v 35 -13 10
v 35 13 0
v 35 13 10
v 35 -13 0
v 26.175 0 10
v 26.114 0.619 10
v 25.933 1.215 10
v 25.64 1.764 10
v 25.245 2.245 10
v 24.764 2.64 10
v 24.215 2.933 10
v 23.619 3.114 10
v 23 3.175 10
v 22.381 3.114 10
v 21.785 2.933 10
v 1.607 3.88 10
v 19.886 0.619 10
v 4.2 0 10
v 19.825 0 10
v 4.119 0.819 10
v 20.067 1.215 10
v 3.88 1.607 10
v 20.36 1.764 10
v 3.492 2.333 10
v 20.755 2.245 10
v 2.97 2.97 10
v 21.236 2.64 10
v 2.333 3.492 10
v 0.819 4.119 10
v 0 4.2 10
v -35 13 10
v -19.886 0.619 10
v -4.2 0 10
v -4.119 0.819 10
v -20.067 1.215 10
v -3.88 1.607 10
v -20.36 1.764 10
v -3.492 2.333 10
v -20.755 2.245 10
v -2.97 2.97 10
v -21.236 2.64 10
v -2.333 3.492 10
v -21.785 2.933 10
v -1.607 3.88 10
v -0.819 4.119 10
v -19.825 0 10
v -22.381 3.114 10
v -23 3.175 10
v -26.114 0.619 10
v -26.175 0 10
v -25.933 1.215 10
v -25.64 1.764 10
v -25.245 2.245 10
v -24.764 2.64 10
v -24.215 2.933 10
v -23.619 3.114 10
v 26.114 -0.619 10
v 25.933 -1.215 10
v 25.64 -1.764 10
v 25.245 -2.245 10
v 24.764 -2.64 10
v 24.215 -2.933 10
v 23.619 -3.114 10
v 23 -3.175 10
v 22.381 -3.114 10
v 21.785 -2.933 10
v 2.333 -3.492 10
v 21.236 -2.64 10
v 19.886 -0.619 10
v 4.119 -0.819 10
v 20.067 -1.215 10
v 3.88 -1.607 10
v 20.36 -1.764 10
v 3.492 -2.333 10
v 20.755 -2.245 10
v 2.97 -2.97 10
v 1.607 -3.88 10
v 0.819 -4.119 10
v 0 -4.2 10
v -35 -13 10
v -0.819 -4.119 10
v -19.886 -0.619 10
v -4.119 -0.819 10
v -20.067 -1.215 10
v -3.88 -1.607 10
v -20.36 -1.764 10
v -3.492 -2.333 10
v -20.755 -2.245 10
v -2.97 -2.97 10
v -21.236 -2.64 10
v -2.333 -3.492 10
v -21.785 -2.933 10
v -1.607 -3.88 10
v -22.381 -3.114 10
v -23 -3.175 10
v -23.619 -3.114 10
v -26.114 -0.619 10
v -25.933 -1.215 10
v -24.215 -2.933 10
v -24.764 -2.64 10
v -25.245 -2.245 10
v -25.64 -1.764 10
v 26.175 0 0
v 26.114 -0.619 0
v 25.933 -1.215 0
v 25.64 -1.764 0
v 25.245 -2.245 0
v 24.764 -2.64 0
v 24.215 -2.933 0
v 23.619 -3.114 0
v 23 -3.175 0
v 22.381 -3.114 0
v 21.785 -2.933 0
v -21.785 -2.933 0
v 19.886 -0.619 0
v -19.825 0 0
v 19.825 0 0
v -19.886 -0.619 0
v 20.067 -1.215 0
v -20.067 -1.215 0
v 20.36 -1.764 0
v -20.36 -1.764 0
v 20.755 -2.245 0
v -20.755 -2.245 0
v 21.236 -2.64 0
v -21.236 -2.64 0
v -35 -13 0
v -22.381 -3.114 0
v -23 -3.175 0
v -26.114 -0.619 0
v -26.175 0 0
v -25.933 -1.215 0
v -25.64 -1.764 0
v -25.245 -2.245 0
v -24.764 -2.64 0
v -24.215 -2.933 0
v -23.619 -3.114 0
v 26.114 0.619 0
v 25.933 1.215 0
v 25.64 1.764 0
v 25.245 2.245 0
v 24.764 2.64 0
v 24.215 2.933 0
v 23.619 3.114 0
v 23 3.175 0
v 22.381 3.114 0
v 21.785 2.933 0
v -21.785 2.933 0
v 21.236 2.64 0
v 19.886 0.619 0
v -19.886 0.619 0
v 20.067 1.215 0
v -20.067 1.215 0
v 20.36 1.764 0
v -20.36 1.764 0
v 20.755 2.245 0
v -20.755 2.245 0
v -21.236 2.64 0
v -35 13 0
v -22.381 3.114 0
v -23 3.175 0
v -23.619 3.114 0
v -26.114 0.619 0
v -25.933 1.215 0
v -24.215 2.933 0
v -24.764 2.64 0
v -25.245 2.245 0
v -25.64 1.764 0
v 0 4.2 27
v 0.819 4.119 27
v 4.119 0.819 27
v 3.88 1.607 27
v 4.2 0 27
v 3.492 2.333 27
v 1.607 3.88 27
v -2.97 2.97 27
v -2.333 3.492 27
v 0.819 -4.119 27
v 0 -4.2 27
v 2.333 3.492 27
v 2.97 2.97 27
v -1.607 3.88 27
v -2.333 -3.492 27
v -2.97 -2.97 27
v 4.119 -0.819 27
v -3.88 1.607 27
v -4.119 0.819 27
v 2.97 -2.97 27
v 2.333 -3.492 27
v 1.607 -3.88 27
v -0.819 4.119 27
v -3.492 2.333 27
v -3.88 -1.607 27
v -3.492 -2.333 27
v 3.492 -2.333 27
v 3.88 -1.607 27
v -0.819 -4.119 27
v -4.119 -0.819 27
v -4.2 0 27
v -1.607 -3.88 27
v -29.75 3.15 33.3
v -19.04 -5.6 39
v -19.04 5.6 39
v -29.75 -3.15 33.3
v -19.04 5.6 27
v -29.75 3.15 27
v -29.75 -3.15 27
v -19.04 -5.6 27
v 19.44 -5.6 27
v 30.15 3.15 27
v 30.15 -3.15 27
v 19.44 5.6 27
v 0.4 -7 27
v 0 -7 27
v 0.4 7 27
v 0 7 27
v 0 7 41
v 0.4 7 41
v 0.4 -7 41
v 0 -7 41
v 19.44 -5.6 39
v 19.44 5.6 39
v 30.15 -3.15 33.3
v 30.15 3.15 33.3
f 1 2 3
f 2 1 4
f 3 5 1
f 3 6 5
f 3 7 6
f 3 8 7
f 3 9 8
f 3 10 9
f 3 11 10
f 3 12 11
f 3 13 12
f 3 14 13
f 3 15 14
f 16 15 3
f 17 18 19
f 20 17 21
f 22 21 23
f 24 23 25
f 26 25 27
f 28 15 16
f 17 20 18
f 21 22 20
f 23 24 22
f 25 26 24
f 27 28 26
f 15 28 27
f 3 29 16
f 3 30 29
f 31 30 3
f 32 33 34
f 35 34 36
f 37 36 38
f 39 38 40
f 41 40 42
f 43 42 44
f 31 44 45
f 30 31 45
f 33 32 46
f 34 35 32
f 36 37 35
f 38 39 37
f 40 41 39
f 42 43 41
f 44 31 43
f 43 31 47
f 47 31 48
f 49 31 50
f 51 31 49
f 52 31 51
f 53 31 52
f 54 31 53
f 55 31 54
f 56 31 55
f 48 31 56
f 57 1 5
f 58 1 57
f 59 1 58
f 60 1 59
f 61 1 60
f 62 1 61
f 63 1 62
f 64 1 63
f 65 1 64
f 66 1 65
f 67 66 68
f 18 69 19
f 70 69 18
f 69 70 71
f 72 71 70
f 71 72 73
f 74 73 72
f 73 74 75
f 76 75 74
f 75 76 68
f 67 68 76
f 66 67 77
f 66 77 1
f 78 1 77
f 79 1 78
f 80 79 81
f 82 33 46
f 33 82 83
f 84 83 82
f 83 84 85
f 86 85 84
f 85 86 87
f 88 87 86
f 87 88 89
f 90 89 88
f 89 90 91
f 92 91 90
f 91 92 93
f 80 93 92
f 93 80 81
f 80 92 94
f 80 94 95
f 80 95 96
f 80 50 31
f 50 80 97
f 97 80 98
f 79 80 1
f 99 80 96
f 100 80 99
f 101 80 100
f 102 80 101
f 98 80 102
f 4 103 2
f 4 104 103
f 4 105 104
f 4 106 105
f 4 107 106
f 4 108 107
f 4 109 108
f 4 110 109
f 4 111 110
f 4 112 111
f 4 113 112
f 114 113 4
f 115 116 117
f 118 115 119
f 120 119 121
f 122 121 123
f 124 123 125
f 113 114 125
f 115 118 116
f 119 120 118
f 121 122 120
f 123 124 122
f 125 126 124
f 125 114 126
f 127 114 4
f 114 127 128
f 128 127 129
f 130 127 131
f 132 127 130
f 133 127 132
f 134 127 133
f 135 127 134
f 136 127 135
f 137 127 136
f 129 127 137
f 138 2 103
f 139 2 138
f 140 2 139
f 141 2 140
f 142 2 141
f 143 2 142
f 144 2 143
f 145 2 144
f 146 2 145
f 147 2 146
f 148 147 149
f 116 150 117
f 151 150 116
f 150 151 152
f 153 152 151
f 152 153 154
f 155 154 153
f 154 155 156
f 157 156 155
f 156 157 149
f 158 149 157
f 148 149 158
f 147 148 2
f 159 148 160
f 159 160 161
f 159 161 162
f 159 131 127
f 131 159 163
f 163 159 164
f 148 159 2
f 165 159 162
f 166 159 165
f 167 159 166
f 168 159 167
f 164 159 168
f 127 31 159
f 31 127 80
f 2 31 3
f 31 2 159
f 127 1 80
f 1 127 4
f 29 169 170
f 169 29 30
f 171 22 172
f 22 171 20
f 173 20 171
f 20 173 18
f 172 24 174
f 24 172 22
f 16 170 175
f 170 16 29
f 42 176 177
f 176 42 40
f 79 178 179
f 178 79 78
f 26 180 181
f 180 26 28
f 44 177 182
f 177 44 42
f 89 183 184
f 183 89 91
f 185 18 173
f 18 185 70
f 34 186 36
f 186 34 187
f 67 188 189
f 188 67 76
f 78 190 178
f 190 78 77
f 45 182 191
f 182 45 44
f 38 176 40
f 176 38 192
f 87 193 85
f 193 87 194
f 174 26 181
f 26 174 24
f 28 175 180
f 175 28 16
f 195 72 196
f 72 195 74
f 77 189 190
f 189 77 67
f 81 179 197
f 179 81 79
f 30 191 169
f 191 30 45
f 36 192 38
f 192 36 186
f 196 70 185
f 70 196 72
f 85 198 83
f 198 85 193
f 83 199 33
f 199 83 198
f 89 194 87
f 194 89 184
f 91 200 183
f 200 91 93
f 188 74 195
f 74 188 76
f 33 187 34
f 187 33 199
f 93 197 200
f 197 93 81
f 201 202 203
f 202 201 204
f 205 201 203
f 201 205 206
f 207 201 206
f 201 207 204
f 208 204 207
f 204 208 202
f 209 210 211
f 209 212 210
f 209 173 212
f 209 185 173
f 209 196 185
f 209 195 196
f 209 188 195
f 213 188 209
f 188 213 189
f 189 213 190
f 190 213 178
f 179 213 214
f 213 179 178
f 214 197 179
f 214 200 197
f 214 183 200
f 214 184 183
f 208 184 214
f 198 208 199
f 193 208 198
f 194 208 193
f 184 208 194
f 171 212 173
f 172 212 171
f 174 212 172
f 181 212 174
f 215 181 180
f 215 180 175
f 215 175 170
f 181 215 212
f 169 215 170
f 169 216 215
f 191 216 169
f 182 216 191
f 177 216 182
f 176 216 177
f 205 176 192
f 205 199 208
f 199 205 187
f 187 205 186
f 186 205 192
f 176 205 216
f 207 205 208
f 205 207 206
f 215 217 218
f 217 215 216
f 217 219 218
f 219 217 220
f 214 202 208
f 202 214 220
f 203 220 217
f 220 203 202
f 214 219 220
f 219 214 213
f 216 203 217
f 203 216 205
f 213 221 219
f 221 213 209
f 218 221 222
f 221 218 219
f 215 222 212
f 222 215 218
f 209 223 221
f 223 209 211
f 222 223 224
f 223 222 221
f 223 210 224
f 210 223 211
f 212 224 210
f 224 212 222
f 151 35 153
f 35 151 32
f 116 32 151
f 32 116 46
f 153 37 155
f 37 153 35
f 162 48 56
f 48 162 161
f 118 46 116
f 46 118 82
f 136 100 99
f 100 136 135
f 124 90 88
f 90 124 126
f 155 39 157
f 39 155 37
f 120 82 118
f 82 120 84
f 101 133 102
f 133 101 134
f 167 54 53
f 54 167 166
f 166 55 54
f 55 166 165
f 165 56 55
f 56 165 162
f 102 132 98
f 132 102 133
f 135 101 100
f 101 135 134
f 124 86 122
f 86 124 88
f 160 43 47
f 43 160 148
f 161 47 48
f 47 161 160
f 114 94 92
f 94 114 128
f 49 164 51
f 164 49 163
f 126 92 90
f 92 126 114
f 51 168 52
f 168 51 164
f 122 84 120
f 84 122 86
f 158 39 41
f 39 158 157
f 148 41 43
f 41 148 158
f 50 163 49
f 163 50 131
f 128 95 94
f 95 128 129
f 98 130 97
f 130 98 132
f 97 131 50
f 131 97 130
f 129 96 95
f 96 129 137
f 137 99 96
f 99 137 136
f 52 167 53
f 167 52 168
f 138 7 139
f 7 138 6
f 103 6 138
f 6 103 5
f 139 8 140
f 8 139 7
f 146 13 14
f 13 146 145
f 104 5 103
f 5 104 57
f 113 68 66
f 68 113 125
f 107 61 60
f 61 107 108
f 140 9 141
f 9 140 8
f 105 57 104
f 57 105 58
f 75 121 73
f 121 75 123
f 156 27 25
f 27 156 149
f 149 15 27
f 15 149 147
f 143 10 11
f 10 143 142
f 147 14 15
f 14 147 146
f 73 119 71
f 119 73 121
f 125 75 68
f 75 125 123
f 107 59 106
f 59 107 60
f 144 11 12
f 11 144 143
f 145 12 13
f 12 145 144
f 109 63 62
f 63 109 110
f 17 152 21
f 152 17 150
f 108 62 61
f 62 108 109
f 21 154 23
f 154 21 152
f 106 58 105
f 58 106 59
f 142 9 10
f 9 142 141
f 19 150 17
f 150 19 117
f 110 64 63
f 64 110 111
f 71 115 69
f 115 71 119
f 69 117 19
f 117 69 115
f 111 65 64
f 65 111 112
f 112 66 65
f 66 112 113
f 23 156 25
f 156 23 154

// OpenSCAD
$fn = 32;

// ----------------------------------------------------------------------
// Boat cleat: 70 mm base, horn 34 mm up
// ----------------------------------------------------------------------

// --- parameters (mm) ---
base_l = 70;              // base length
base_w = 26;              // base width
base_t = 10;              // base thickness
horn_len = 59.5;          // horn length
horn_d = 14;              // horn diameter at the middle
horn_z = 34;              // horn axis height
end_drop = 8;             // how far the horn tips drop
post_d = 8.4;             // centre post diameter
holes_d = 6.35;           // fixing holes
hole_x = 23;              // fixing hole spacing

difference() {
  union() {
    translate([-35, -13, 0]) cube([base_l, base_w, base_t]);
    /* centre post, sunk 1 mm into the base */
    translate([0, 0, 9]) cylinder(h = 25, d = post_d);
    /* horn: a hull chain of boxes, full in the middle and lighter at the tips */
    hull() {
      translate([-29.75, -3.15, 27]) cube([0.4, 6.3, 6.3], center = false);
      translate([-19.04, -5.6, 27]) cube([0.4, 11.2, 12], center = false);
    }
    hull() {
      translate([-19.04, -5.6, 27]) cube([0.4, 11.2, 12], center = false);
      translate([0, -7, 27]) cube([0.4, 14, 14], center = false);
    }
    hull() {
      translate([0, -7, 27]) cube([0.4, 14, 14], center = false);
      translate([19.04, -5.6, 27]) cube([0.4, 11.2, 12], center = false);
    }
    hull() {
      translate([19.04, -5.6, 27]) cube([0.4, 11.2, 12], center = false);
      translate([29.75, -3.15, 27]) cube([0.4, 6.3, 6.3], center = false);
    }
  }
  translate([-23, 0, -2.5]) cylinder(h = base_t + 5, d = holes_d);
  translate([23, 0, -2.5]) cylinder(h = base_t + 5, d = holes_d);
}
